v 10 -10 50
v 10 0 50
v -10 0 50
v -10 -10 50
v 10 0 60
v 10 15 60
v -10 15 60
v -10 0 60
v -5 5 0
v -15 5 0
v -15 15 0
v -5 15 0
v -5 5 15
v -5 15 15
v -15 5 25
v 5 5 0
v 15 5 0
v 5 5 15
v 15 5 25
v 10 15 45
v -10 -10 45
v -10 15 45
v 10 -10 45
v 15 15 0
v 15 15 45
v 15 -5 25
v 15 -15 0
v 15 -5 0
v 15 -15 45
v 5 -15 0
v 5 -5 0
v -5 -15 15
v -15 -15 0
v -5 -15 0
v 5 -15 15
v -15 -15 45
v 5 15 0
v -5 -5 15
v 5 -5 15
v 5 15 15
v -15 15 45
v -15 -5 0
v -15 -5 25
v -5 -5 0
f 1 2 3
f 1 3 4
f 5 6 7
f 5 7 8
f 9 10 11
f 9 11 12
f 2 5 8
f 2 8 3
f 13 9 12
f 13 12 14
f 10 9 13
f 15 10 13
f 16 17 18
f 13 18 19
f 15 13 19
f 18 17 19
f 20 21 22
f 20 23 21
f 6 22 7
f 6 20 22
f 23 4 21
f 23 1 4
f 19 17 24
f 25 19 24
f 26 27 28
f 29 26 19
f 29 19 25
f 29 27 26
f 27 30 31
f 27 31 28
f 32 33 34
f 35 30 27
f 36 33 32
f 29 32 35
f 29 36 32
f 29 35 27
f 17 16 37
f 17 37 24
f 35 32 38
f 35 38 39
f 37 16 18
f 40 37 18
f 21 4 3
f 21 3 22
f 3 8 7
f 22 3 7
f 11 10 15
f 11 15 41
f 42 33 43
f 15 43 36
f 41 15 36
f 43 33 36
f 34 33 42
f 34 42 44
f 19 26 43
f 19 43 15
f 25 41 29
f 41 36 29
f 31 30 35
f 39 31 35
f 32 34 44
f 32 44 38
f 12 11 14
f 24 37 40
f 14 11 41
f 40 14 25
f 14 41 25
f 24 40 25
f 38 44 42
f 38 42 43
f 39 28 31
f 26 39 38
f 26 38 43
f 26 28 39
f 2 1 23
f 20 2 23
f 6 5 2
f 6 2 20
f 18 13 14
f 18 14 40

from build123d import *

# Parameters (mm, degrees)
F0_W          = 30
F0_H          = 45
F1_DEPTH      = 15
F2_W          = 10
F2_H          = 15
F3_DEPTH      = 30.001
F4_W          = 10
F4_H          = 25
F5_DEPTH      = 15.001
F5_DEPTH_BACK = 15.001
F7_DEPTH      = 10


with BuildPart() as f1:
    # F0 (on Front) → F1 (new body, symmetric)
    with BuildSketch(Plane.XZ):
        with Locations((0, 22.5)):
            Rectangle(F0_W, F0_H)
    extrude(amount=F1_DEPTH, both=True)

    # F2 (on face) → F3 (cut, through all)
    with BuildSketch(Plane.XZ.offset(15)):
        with Locations((0, 7.5)):
            Rectangle(F2_W, F2_H)
    extrude(amount=-F3_DEPTH, mode=Mode.SUBTRACT)

    # F4 (on Right) → F5 (cut, two sides)
    with BuildSketch(Plane.YZ) as f5_sk:
        with Locations((0, 12.5)):
            Rectangle(F4_W, F4_H)
    extrude(amount=-F5_DEPTH, mode=Mode.SUBTRACT)
    extrude(f5_sk.sketch, amount=F5_DEPTH_BACK, mode=Mode.SUBTRACT)


with BuildPart() as f7:
    # F6 (on Right) → F7 (new body, symmetric)
    with BuildSketch(Plane.YZ):
        Polygon((15, 45), (15, 60), (0, 60), (0, 50), (-10, 50), (-10, 45), align=None)
    extrude(amount=F7_DEPTH, both=True)


solid = Compound([f1.part, f7.part])
